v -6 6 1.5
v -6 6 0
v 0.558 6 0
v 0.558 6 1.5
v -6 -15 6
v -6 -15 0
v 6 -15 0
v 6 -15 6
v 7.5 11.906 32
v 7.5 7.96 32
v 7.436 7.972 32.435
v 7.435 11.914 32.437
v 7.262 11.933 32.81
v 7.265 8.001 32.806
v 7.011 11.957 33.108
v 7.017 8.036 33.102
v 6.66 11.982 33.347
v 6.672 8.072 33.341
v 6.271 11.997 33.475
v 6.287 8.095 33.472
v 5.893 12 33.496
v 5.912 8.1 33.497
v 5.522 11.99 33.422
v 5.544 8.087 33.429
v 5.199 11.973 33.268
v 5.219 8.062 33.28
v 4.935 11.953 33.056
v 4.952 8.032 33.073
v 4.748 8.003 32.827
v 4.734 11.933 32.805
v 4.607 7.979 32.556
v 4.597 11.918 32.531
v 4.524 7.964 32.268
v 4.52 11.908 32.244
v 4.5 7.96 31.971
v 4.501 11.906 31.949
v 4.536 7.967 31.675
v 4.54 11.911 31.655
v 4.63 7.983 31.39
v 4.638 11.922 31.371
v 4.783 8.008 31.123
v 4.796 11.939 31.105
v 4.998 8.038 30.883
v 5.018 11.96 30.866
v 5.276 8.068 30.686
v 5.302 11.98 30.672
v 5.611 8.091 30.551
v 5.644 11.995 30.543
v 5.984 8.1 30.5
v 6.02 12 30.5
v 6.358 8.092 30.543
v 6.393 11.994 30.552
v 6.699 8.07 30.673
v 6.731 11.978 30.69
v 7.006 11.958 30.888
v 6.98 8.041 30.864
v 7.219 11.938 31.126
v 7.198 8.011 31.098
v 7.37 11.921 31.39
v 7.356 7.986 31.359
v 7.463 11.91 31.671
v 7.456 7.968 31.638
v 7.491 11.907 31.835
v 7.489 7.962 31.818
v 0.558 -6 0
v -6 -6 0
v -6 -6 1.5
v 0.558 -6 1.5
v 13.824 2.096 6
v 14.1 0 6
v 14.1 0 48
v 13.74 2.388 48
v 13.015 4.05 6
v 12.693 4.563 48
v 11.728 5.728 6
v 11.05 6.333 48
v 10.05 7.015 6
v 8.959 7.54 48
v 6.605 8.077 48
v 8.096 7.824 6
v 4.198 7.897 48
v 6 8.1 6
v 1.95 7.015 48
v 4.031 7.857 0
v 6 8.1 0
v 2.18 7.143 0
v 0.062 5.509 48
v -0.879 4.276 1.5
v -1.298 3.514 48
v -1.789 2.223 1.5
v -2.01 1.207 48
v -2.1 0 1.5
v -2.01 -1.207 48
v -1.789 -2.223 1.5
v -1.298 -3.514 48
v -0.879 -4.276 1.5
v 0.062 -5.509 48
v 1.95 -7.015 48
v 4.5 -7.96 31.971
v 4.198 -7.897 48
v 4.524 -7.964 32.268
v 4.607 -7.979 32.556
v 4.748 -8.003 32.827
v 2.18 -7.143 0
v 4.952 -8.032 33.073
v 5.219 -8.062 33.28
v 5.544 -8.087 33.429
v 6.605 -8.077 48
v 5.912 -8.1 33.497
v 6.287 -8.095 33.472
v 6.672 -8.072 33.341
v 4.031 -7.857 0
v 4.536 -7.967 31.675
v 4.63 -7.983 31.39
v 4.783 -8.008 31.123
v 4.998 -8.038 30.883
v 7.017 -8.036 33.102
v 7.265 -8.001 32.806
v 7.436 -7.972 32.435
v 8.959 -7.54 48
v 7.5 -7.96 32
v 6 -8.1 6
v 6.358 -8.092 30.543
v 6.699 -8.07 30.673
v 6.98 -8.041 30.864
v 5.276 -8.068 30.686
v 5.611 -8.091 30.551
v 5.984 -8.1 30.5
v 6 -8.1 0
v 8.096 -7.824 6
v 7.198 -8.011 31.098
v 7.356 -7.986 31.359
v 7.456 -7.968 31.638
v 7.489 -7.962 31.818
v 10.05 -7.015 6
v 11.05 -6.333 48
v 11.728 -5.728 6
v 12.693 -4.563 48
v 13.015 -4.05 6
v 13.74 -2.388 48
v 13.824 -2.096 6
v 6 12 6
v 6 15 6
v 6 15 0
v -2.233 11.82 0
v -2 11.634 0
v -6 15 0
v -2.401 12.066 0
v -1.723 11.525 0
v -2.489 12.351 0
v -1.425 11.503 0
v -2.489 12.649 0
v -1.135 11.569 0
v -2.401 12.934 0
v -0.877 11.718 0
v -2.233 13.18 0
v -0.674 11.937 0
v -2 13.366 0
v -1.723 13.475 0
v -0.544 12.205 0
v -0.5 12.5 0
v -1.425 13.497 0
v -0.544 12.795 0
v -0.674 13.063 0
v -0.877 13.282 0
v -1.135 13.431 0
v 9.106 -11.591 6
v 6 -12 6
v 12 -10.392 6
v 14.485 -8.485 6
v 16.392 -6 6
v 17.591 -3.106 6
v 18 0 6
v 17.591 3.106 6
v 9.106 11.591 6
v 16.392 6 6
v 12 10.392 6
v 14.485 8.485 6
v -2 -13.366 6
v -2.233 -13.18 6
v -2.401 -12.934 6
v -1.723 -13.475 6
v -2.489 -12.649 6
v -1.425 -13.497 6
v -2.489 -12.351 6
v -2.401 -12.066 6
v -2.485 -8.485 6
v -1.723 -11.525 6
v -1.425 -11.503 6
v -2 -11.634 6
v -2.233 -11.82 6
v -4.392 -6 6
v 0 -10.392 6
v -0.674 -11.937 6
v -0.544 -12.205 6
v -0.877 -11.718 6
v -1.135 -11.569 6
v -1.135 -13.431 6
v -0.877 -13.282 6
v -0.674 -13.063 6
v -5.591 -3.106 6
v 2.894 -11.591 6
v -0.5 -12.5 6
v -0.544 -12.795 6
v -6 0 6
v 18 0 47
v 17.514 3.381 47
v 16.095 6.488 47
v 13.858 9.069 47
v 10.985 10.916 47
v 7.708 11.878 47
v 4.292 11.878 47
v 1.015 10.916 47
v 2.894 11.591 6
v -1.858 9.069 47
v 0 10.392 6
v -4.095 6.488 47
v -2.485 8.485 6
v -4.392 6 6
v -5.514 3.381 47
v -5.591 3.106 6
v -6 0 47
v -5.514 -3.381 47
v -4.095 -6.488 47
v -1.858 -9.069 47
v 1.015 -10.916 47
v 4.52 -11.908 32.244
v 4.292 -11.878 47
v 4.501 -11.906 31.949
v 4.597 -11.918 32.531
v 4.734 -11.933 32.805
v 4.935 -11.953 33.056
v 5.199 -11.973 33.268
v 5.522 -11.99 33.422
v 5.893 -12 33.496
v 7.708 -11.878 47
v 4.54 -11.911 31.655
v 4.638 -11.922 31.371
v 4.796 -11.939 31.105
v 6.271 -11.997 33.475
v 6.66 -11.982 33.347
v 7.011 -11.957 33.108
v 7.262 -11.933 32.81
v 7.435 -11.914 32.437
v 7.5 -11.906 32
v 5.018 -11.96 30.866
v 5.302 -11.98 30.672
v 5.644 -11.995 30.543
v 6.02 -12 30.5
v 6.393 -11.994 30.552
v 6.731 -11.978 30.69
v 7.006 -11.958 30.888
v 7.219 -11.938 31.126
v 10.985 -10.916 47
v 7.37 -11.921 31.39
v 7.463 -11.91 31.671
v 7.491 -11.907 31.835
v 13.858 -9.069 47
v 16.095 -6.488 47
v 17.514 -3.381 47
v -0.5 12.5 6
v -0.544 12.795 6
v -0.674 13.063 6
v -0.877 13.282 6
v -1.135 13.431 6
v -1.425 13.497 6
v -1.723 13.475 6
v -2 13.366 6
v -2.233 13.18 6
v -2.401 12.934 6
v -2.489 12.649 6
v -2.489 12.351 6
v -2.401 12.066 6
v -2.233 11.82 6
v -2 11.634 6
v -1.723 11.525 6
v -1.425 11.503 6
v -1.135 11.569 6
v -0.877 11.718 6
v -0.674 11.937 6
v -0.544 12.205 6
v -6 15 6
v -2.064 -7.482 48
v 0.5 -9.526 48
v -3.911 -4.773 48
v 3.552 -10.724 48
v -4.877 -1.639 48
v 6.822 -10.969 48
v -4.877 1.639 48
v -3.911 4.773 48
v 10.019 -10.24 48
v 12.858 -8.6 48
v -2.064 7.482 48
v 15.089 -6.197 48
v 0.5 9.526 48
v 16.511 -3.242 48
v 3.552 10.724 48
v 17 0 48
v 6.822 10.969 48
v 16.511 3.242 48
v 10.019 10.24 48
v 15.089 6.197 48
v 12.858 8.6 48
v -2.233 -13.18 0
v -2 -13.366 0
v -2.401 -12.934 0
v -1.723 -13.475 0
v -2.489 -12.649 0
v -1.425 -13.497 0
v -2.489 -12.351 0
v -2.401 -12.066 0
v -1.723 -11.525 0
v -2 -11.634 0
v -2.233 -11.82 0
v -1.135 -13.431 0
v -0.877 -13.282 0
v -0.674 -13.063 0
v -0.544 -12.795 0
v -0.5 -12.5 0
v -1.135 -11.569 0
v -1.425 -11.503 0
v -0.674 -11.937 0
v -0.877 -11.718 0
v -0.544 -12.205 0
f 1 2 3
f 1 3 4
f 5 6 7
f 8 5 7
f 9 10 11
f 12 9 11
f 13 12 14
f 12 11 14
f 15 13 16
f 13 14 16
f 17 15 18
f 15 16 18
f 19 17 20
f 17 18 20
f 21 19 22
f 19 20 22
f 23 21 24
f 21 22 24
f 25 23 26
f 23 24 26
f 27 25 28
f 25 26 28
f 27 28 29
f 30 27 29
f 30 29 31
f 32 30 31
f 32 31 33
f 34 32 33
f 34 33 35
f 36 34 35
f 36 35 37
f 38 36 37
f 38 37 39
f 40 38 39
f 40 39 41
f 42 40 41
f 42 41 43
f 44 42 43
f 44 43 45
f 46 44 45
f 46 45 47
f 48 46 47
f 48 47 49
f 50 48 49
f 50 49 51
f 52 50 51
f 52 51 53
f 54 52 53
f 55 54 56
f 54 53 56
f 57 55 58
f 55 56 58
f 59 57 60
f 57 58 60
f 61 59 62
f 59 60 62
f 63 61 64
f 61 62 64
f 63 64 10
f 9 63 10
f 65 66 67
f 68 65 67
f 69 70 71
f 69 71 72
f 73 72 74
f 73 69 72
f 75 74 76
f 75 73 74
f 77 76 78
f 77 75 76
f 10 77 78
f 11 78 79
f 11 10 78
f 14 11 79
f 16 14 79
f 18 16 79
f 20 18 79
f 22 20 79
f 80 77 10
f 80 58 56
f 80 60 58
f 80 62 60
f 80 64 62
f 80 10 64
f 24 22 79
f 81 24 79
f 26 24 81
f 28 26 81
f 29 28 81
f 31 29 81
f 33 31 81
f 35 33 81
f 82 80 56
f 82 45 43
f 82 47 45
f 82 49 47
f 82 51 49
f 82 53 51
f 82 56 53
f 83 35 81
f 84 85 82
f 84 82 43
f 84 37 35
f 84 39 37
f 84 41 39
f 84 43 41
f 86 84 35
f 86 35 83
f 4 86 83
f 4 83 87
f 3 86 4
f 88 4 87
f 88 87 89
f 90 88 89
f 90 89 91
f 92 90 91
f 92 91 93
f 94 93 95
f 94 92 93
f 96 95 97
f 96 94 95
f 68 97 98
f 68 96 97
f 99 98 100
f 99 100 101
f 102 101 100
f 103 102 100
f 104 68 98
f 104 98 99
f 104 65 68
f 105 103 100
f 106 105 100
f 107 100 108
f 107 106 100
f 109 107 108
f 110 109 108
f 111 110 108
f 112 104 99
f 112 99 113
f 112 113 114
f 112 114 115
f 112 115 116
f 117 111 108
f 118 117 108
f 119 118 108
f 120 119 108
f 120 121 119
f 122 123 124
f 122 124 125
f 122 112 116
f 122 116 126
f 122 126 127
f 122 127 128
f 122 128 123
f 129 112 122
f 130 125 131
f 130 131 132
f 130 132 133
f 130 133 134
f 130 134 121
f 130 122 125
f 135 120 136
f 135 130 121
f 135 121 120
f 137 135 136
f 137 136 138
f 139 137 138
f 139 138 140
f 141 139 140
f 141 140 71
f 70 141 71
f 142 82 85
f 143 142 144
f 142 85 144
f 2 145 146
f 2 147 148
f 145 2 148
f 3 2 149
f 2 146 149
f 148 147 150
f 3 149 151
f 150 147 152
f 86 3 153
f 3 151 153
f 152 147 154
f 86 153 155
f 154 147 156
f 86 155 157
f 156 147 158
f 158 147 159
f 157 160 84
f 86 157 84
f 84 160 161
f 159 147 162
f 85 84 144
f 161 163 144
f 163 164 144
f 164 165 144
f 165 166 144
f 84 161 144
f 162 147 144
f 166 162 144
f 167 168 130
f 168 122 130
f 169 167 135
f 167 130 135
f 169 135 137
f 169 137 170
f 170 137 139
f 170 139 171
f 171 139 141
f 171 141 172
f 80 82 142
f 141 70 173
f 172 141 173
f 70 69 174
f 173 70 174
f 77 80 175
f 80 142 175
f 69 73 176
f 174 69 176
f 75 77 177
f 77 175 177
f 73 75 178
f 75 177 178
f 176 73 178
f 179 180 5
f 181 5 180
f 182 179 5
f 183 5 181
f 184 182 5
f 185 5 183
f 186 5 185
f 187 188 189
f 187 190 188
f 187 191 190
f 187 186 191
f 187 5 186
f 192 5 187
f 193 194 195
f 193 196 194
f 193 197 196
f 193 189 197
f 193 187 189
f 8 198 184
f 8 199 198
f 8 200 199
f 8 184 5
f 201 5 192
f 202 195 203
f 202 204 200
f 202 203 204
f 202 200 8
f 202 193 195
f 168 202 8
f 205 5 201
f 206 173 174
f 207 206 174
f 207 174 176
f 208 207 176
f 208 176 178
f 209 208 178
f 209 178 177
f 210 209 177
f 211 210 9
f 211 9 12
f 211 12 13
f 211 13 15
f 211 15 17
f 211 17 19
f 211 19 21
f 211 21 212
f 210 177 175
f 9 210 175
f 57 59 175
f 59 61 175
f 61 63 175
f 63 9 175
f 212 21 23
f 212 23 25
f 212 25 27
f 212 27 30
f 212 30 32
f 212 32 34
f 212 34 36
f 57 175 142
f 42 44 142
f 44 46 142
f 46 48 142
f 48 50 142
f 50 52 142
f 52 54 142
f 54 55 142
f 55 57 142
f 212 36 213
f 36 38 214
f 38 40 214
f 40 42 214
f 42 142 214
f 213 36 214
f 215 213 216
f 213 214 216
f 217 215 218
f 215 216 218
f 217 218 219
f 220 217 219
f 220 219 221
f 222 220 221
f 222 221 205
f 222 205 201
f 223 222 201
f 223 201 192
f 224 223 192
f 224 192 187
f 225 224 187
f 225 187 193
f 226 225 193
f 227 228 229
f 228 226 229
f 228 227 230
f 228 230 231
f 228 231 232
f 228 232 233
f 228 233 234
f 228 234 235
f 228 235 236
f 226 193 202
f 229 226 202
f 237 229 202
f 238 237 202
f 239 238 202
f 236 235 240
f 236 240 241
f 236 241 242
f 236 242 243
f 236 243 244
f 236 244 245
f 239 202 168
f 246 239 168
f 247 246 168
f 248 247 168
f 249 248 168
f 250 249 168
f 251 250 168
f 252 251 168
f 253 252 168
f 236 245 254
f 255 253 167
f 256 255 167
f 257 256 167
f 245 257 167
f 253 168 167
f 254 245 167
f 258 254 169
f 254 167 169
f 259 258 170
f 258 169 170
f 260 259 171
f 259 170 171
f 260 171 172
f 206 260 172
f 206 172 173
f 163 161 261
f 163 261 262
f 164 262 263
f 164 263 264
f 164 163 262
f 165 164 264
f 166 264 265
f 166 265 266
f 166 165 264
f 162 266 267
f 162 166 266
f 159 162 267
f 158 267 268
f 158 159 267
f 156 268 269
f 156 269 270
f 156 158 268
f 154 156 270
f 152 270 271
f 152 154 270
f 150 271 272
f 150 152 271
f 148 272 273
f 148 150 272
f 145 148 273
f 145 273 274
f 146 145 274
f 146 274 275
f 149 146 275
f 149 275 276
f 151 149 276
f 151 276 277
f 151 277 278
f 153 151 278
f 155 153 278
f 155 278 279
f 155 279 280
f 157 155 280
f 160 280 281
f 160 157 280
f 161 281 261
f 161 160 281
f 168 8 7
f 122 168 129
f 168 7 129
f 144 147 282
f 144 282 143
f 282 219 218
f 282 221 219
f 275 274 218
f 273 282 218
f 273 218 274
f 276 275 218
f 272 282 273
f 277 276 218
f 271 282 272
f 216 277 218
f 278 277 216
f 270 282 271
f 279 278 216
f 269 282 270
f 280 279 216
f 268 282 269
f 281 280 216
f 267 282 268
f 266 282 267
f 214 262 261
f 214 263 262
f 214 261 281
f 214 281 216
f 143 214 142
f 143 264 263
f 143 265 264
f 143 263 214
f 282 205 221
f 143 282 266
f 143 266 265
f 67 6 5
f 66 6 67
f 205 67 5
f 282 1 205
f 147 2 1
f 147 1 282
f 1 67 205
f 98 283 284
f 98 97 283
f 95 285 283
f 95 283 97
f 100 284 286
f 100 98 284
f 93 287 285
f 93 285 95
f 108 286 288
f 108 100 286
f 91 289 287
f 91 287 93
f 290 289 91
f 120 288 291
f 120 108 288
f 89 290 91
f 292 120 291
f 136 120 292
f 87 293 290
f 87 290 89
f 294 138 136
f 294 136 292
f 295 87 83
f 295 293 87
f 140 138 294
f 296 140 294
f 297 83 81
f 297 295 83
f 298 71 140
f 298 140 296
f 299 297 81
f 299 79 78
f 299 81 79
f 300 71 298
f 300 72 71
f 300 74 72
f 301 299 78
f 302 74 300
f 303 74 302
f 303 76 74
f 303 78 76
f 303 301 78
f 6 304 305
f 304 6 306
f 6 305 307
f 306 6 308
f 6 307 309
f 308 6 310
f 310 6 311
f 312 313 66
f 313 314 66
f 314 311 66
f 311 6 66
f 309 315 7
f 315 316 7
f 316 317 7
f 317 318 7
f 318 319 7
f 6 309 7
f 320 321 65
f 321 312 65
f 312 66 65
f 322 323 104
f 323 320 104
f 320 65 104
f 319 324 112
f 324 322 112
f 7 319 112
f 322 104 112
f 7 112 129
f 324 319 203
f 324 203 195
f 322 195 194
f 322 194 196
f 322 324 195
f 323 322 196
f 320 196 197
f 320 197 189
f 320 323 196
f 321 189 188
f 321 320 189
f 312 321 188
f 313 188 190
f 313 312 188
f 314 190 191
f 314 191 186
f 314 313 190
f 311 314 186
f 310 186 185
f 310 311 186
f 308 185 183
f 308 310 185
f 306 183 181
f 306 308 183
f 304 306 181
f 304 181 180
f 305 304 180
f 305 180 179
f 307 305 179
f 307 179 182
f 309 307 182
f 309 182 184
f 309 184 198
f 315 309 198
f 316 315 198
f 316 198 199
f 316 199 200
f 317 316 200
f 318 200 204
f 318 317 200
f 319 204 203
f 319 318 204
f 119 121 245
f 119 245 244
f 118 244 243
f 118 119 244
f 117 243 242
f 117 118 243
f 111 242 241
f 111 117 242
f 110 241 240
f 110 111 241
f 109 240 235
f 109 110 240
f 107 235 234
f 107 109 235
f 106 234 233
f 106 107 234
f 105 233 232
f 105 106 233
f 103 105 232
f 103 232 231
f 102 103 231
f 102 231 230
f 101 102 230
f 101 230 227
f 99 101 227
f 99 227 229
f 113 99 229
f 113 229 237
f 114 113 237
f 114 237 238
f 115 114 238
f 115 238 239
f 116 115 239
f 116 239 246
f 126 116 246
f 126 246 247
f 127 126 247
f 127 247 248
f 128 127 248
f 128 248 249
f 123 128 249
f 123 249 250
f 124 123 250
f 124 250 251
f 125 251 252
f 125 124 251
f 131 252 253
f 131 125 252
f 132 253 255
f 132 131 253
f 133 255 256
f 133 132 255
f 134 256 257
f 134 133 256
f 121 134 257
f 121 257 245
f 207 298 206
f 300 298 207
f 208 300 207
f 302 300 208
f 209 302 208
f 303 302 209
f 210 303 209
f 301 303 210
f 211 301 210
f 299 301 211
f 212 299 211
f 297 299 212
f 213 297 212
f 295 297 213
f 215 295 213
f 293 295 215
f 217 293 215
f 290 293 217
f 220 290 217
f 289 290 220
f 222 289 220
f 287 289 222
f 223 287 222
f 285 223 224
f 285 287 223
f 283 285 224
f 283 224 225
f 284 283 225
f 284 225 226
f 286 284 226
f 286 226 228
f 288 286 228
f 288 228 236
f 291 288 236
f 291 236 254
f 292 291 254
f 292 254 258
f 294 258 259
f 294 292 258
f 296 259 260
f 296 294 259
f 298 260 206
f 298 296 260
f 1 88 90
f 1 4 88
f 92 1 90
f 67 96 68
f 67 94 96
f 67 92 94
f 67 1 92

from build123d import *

# Parameters (mm, degrees)
F0_W          = 12
F0_H          = 30
F0_R          = 1
F1_DEPTH      = 6
F2_R          = 12
F2_R_2        = 8.1
F3_DEPTH      = 42
F4_DEPTH      = 6.001
F5_W          = 12
F5_H          = 1.5
F6_DEPTH      = 24.001
F7_R          = 1.5
F8_DEPTH      = 15.001
F8_DEPTH_BACK = 15.001
F9_SIZE       = 1


with BuildPart() as f1:
    # F0 (on Top) → F1 (new body)
    with BuildSketch(Plane.XY):
        Rectangle(F0_W, F0_H)
        with Locations((-1.5, -12.5)):
            Circle(F0_R, mode=Mode.SUBTRACT)
        with Locations((-1.5, 12.5)):
            Circle(F0_R, mode=Mode.SUBTRACT)
    extrude(amount=F1_DEPTH)

    # F2 (on face) → F3 (join)
    with BuildSketch(Plane.XY.offset(6)):
        with Locations((6, 0)):
            Circle(F2_R)
        with Locations((6, 0)):
            Circle(F2_R_2, mode=Mode.SUBTRACT)
    extrude(amount=F3_DEPTH)

    # F4 (cut, through all): a face of the model
    f4_faces = [f1.faces().sort_by_distance(p)[0] for p in [
        (2.5622532292, 0, 6),
    ]]
    extrude(f4_faces, amount=-F4_DEPTH, mode=Mode.SUBTRACT)

    # F5 (on face) → F6 (cut, through all)
    with BuildSketch(Plane(origin=(-6, 0, 0), x_dir=(0, -1, 0), z_dir=(-1, 0, 0))):
        with Locations((0, 0.75)):
            Rectangle(F5_W, F5_H)
    extrude(amount=-F6_DEPTH, mode=Mode.SUBTRACT)

    # F7 (on Front) → F8 (cut, two sides)
    with BuildSketch(Plane.XZ) as f8_sk:
        with Locations((6, 32)):
            Circle(F7_R)
    extrude(amount=-F8_DEPTH, mode=Mode.SUBTRACT)
    extrude(f8_sk.sketch, amount=F8_DEPTH_BACK, mode=Mode.SUBTRACT)

    # F9
    f9_edges = [f1.edges().sort_by_distance(p)[0] for p in [
        (-6, 0, 48),
    ]]
    chamfer(f9_edges, length=F9_SIZE)


solid = f1.part
